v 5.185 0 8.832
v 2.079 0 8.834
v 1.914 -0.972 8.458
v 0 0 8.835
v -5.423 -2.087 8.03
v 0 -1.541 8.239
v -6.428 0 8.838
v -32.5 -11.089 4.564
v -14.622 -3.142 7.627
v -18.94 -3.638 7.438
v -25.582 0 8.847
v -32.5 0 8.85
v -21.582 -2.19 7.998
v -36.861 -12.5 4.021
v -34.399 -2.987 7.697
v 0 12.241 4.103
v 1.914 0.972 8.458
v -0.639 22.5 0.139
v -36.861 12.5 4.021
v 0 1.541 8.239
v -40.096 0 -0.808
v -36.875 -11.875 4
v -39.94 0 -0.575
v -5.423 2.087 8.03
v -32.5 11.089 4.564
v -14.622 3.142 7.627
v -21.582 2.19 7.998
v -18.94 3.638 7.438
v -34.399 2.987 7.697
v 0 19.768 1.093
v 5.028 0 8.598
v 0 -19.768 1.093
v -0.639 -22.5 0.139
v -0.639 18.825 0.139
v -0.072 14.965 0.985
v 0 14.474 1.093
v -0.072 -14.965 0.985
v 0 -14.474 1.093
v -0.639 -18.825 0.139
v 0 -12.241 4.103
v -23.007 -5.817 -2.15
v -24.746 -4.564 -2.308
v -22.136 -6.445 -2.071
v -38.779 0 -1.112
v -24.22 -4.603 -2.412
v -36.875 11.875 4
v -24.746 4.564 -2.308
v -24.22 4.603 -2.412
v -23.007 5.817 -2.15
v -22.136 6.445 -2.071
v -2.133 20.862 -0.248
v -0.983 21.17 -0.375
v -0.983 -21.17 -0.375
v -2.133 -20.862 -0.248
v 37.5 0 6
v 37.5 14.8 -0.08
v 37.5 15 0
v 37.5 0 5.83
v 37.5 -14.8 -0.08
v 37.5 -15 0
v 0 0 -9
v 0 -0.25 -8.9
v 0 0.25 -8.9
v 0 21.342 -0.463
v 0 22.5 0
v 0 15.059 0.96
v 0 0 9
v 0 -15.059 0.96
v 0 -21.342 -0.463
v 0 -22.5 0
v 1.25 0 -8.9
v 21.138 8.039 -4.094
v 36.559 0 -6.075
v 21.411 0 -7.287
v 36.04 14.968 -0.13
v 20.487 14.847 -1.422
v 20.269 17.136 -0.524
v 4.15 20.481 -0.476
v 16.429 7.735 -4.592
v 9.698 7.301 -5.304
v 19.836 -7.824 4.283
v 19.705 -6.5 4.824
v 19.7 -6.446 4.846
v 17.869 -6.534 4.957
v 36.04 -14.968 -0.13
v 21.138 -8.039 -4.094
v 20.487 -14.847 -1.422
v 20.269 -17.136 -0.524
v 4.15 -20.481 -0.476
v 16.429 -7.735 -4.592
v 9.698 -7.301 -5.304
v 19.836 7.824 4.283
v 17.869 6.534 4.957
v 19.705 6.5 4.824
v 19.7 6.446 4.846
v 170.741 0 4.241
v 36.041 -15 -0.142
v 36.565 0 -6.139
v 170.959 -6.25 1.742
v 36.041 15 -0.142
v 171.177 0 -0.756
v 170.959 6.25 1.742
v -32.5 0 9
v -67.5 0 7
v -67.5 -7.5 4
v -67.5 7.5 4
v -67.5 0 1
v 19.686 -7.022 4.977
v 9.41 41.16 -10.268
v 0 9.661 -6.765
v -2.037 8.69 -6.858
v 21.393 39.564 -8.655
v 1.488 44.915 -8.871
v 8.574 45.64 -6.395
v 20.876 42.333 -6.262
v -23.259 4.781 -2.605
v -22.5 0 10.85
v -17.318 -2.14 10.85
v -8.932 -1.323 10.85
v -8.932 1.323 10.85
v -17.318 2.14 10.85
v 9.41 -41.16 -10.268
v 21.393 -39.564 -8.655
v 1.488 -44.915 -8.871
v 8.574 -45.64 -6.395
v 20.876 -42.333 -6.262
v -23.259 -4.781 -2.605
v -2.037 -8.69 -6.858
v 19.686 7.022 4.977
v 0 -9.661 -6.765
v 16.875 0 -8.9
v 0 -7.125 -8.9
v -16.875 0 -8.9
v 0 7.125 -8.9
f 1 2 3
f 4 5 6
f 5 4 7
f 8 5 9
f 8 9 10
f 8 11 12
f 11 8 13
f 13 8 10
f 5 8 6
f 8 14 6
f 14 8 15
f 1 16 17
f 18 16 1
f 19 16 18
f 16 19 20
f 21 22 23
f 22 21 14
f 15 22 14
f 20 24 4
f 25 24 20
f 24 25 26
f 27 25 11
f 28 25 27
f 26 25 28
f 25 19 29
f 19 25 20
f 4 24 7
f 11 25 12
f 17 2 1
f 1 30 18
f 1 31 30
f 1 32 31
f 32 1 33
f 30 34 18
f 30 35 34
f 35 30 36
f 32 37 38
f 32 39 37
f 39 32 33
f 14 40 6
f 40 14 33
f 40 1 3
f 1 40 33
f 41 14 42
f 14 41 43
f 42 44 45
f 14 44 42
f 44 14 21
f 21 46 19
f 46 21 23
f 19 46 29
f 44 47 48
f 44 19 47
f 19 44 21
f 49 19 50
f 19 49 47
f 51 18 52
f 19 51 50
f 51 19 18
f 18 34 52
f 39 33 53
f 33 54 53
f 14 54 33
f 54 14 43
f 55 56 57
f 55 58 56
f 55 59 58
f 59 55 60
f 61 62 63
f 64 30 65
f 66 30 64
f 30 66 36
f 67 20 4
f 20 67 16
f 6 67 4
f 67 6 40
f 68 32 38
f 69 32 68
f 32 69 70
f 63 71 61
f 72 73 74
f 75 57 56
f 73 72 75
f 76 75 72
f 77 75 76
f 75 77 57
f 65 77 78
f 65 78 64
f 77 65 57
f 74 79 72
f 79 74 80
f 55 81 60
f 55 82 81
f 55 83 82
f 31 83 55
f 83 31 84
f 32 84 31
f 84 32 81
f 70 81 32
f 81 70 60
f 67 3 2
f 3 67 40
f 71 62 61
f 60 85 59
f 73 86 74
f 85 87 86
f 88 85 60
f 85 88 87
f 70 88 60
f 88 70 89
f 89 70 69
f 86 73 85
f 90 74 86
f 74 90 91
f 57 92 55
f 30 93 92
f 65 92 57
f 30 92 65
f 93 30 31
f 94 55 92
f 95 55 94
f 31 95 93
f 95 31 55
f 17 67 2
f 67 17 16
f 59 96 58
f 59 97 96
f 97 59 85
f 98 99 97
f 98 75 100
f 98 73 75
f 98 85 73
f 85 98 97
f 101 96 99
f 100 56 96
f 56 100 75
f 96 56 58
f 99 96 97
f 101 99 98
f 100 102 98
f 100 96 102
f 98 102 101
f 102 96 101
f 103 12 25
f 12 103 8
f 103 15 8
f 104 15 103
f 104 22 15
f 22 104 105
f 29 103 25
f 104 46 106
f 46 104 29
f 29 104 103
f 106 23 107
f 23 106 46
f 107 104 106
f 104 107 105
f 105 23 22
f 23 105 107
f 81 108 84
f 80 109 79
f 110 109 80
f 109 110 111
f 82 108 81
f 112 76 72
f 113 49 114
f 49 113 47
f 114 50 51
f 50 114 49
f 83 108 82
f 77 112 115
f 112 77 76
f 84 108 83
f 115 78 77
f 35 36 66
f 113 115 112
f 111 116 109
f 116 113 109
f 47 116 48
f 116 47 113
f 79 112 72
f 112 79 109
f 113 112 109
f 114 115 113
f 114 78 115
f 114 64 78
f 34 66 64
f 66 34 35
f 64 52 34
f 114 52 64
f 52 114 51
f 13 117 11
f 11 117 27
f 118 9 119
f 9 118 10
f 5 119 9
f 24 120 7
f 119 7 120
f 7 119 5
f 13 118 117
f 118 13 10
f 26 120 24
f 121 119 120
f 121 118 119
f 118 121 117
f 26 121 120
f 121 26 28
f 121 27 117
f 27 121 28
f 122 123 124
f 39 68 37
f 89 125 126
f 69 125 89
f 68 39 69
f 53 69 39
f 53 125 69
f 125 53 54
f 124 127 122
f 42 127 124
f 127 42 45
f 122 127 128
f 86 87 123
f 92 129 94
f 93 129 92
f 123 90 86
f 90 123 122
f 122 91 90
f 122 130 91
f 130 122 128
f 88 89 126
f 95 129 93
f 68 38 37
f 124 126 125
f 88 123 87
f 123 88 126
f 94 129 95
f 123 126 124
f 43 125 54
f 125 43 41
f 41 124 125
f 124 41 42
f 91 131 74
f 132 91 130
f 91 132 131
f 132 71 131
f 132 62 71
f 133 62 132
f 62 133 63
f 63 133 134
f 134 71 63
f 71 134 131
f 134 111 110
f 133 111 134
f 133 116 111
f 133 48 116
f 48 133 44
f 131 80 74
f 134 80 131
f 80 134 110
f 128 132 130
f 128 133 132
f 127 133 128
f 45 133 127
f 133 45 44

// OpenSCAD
Rumpf=4;
Wing=5;


rotate([0,90,0]){
	scale([0.4,1,1]){
		translate([-5.2,0,-37.5/2]){
			scale([1,1,1]){
				rotate([0,-15,180]){
				cylinder(h=75/2,d1=25,d2=45,$fn=Rumpf,center=true);
				}
			}
		}
		translate([0,0,37.5/2]){
			scale([1,1,1]){
				rotate([0,0,180]){
					cylinder(h=75/2,d1=45,d2=30,$fn=Rumpf,center=true);
				}
			}
		}
		translate([-2,0,135/2+75/2-1.5]){
			rotate([0,2,180]){
				cylinder(h=135,d1=30,d2=12.5,$fn=Rumpf,center=true);
			}
		}
		translate([-10,0,-35-75/2+5]){
			rotate([0,0,180]){
				scale([1,1,1]){
					cylinder(h=35,d1=15,d2=25,$fn=Rumpf,center=false);}
				}
			}

		translate([0,0,0]){
			rotate([0,75,56]){
				translate([0,2.35,25/2+17.5/2]){
					rotate([-10,0,-2]){
						scale([1.5,0.75,1]){
							cylinder(h=55,d1=37,d2=15,$fn=Wing,center=true);
						}
					}
				}
			}
		}
		translate([-4,0,-15]){
			rotate([0,90,180]){
				translate([0,0,25/4+17.5/2]){
					scale([1,0.3,0.65]){
						rotate([0,0,0]){
							cylinder(h=25,d1=35,d2=15,$fn=5,center=true);
						}
					}
					}
				}
			}
		translate([0,0,0]){
			rotate([0,75,304]){
				translate([0,-2.35,25/2+17.5/2]){
					rotate([10,0,2]){
						scale([1.5,0.75,1]){
							cylinder(h=55,d1=37,d2=15,$fn=Wing,center=true);
						}
					}
				}
			}
		}
		translate([0,0,0]){
			rotate([0,90,0]){
				translate([0,0,25/2+17.5/2-9]){
					scale([2.25,0.95,0.8]){
						cylinder(h=25,d1=35,d2=15,$fn=4,center=true);
					}
					}
				}
			}
		translate([0,0,0]){
			rotate([0,90,-20]){
				translate([0,0,25/2+17.5/2-5]){
					scale([3.25,0.55,0.75]){
						//cylinder(h=25,d1=35,d2=15,$fn=4,center=true);
					}
					}
				}
			}
		}
}
